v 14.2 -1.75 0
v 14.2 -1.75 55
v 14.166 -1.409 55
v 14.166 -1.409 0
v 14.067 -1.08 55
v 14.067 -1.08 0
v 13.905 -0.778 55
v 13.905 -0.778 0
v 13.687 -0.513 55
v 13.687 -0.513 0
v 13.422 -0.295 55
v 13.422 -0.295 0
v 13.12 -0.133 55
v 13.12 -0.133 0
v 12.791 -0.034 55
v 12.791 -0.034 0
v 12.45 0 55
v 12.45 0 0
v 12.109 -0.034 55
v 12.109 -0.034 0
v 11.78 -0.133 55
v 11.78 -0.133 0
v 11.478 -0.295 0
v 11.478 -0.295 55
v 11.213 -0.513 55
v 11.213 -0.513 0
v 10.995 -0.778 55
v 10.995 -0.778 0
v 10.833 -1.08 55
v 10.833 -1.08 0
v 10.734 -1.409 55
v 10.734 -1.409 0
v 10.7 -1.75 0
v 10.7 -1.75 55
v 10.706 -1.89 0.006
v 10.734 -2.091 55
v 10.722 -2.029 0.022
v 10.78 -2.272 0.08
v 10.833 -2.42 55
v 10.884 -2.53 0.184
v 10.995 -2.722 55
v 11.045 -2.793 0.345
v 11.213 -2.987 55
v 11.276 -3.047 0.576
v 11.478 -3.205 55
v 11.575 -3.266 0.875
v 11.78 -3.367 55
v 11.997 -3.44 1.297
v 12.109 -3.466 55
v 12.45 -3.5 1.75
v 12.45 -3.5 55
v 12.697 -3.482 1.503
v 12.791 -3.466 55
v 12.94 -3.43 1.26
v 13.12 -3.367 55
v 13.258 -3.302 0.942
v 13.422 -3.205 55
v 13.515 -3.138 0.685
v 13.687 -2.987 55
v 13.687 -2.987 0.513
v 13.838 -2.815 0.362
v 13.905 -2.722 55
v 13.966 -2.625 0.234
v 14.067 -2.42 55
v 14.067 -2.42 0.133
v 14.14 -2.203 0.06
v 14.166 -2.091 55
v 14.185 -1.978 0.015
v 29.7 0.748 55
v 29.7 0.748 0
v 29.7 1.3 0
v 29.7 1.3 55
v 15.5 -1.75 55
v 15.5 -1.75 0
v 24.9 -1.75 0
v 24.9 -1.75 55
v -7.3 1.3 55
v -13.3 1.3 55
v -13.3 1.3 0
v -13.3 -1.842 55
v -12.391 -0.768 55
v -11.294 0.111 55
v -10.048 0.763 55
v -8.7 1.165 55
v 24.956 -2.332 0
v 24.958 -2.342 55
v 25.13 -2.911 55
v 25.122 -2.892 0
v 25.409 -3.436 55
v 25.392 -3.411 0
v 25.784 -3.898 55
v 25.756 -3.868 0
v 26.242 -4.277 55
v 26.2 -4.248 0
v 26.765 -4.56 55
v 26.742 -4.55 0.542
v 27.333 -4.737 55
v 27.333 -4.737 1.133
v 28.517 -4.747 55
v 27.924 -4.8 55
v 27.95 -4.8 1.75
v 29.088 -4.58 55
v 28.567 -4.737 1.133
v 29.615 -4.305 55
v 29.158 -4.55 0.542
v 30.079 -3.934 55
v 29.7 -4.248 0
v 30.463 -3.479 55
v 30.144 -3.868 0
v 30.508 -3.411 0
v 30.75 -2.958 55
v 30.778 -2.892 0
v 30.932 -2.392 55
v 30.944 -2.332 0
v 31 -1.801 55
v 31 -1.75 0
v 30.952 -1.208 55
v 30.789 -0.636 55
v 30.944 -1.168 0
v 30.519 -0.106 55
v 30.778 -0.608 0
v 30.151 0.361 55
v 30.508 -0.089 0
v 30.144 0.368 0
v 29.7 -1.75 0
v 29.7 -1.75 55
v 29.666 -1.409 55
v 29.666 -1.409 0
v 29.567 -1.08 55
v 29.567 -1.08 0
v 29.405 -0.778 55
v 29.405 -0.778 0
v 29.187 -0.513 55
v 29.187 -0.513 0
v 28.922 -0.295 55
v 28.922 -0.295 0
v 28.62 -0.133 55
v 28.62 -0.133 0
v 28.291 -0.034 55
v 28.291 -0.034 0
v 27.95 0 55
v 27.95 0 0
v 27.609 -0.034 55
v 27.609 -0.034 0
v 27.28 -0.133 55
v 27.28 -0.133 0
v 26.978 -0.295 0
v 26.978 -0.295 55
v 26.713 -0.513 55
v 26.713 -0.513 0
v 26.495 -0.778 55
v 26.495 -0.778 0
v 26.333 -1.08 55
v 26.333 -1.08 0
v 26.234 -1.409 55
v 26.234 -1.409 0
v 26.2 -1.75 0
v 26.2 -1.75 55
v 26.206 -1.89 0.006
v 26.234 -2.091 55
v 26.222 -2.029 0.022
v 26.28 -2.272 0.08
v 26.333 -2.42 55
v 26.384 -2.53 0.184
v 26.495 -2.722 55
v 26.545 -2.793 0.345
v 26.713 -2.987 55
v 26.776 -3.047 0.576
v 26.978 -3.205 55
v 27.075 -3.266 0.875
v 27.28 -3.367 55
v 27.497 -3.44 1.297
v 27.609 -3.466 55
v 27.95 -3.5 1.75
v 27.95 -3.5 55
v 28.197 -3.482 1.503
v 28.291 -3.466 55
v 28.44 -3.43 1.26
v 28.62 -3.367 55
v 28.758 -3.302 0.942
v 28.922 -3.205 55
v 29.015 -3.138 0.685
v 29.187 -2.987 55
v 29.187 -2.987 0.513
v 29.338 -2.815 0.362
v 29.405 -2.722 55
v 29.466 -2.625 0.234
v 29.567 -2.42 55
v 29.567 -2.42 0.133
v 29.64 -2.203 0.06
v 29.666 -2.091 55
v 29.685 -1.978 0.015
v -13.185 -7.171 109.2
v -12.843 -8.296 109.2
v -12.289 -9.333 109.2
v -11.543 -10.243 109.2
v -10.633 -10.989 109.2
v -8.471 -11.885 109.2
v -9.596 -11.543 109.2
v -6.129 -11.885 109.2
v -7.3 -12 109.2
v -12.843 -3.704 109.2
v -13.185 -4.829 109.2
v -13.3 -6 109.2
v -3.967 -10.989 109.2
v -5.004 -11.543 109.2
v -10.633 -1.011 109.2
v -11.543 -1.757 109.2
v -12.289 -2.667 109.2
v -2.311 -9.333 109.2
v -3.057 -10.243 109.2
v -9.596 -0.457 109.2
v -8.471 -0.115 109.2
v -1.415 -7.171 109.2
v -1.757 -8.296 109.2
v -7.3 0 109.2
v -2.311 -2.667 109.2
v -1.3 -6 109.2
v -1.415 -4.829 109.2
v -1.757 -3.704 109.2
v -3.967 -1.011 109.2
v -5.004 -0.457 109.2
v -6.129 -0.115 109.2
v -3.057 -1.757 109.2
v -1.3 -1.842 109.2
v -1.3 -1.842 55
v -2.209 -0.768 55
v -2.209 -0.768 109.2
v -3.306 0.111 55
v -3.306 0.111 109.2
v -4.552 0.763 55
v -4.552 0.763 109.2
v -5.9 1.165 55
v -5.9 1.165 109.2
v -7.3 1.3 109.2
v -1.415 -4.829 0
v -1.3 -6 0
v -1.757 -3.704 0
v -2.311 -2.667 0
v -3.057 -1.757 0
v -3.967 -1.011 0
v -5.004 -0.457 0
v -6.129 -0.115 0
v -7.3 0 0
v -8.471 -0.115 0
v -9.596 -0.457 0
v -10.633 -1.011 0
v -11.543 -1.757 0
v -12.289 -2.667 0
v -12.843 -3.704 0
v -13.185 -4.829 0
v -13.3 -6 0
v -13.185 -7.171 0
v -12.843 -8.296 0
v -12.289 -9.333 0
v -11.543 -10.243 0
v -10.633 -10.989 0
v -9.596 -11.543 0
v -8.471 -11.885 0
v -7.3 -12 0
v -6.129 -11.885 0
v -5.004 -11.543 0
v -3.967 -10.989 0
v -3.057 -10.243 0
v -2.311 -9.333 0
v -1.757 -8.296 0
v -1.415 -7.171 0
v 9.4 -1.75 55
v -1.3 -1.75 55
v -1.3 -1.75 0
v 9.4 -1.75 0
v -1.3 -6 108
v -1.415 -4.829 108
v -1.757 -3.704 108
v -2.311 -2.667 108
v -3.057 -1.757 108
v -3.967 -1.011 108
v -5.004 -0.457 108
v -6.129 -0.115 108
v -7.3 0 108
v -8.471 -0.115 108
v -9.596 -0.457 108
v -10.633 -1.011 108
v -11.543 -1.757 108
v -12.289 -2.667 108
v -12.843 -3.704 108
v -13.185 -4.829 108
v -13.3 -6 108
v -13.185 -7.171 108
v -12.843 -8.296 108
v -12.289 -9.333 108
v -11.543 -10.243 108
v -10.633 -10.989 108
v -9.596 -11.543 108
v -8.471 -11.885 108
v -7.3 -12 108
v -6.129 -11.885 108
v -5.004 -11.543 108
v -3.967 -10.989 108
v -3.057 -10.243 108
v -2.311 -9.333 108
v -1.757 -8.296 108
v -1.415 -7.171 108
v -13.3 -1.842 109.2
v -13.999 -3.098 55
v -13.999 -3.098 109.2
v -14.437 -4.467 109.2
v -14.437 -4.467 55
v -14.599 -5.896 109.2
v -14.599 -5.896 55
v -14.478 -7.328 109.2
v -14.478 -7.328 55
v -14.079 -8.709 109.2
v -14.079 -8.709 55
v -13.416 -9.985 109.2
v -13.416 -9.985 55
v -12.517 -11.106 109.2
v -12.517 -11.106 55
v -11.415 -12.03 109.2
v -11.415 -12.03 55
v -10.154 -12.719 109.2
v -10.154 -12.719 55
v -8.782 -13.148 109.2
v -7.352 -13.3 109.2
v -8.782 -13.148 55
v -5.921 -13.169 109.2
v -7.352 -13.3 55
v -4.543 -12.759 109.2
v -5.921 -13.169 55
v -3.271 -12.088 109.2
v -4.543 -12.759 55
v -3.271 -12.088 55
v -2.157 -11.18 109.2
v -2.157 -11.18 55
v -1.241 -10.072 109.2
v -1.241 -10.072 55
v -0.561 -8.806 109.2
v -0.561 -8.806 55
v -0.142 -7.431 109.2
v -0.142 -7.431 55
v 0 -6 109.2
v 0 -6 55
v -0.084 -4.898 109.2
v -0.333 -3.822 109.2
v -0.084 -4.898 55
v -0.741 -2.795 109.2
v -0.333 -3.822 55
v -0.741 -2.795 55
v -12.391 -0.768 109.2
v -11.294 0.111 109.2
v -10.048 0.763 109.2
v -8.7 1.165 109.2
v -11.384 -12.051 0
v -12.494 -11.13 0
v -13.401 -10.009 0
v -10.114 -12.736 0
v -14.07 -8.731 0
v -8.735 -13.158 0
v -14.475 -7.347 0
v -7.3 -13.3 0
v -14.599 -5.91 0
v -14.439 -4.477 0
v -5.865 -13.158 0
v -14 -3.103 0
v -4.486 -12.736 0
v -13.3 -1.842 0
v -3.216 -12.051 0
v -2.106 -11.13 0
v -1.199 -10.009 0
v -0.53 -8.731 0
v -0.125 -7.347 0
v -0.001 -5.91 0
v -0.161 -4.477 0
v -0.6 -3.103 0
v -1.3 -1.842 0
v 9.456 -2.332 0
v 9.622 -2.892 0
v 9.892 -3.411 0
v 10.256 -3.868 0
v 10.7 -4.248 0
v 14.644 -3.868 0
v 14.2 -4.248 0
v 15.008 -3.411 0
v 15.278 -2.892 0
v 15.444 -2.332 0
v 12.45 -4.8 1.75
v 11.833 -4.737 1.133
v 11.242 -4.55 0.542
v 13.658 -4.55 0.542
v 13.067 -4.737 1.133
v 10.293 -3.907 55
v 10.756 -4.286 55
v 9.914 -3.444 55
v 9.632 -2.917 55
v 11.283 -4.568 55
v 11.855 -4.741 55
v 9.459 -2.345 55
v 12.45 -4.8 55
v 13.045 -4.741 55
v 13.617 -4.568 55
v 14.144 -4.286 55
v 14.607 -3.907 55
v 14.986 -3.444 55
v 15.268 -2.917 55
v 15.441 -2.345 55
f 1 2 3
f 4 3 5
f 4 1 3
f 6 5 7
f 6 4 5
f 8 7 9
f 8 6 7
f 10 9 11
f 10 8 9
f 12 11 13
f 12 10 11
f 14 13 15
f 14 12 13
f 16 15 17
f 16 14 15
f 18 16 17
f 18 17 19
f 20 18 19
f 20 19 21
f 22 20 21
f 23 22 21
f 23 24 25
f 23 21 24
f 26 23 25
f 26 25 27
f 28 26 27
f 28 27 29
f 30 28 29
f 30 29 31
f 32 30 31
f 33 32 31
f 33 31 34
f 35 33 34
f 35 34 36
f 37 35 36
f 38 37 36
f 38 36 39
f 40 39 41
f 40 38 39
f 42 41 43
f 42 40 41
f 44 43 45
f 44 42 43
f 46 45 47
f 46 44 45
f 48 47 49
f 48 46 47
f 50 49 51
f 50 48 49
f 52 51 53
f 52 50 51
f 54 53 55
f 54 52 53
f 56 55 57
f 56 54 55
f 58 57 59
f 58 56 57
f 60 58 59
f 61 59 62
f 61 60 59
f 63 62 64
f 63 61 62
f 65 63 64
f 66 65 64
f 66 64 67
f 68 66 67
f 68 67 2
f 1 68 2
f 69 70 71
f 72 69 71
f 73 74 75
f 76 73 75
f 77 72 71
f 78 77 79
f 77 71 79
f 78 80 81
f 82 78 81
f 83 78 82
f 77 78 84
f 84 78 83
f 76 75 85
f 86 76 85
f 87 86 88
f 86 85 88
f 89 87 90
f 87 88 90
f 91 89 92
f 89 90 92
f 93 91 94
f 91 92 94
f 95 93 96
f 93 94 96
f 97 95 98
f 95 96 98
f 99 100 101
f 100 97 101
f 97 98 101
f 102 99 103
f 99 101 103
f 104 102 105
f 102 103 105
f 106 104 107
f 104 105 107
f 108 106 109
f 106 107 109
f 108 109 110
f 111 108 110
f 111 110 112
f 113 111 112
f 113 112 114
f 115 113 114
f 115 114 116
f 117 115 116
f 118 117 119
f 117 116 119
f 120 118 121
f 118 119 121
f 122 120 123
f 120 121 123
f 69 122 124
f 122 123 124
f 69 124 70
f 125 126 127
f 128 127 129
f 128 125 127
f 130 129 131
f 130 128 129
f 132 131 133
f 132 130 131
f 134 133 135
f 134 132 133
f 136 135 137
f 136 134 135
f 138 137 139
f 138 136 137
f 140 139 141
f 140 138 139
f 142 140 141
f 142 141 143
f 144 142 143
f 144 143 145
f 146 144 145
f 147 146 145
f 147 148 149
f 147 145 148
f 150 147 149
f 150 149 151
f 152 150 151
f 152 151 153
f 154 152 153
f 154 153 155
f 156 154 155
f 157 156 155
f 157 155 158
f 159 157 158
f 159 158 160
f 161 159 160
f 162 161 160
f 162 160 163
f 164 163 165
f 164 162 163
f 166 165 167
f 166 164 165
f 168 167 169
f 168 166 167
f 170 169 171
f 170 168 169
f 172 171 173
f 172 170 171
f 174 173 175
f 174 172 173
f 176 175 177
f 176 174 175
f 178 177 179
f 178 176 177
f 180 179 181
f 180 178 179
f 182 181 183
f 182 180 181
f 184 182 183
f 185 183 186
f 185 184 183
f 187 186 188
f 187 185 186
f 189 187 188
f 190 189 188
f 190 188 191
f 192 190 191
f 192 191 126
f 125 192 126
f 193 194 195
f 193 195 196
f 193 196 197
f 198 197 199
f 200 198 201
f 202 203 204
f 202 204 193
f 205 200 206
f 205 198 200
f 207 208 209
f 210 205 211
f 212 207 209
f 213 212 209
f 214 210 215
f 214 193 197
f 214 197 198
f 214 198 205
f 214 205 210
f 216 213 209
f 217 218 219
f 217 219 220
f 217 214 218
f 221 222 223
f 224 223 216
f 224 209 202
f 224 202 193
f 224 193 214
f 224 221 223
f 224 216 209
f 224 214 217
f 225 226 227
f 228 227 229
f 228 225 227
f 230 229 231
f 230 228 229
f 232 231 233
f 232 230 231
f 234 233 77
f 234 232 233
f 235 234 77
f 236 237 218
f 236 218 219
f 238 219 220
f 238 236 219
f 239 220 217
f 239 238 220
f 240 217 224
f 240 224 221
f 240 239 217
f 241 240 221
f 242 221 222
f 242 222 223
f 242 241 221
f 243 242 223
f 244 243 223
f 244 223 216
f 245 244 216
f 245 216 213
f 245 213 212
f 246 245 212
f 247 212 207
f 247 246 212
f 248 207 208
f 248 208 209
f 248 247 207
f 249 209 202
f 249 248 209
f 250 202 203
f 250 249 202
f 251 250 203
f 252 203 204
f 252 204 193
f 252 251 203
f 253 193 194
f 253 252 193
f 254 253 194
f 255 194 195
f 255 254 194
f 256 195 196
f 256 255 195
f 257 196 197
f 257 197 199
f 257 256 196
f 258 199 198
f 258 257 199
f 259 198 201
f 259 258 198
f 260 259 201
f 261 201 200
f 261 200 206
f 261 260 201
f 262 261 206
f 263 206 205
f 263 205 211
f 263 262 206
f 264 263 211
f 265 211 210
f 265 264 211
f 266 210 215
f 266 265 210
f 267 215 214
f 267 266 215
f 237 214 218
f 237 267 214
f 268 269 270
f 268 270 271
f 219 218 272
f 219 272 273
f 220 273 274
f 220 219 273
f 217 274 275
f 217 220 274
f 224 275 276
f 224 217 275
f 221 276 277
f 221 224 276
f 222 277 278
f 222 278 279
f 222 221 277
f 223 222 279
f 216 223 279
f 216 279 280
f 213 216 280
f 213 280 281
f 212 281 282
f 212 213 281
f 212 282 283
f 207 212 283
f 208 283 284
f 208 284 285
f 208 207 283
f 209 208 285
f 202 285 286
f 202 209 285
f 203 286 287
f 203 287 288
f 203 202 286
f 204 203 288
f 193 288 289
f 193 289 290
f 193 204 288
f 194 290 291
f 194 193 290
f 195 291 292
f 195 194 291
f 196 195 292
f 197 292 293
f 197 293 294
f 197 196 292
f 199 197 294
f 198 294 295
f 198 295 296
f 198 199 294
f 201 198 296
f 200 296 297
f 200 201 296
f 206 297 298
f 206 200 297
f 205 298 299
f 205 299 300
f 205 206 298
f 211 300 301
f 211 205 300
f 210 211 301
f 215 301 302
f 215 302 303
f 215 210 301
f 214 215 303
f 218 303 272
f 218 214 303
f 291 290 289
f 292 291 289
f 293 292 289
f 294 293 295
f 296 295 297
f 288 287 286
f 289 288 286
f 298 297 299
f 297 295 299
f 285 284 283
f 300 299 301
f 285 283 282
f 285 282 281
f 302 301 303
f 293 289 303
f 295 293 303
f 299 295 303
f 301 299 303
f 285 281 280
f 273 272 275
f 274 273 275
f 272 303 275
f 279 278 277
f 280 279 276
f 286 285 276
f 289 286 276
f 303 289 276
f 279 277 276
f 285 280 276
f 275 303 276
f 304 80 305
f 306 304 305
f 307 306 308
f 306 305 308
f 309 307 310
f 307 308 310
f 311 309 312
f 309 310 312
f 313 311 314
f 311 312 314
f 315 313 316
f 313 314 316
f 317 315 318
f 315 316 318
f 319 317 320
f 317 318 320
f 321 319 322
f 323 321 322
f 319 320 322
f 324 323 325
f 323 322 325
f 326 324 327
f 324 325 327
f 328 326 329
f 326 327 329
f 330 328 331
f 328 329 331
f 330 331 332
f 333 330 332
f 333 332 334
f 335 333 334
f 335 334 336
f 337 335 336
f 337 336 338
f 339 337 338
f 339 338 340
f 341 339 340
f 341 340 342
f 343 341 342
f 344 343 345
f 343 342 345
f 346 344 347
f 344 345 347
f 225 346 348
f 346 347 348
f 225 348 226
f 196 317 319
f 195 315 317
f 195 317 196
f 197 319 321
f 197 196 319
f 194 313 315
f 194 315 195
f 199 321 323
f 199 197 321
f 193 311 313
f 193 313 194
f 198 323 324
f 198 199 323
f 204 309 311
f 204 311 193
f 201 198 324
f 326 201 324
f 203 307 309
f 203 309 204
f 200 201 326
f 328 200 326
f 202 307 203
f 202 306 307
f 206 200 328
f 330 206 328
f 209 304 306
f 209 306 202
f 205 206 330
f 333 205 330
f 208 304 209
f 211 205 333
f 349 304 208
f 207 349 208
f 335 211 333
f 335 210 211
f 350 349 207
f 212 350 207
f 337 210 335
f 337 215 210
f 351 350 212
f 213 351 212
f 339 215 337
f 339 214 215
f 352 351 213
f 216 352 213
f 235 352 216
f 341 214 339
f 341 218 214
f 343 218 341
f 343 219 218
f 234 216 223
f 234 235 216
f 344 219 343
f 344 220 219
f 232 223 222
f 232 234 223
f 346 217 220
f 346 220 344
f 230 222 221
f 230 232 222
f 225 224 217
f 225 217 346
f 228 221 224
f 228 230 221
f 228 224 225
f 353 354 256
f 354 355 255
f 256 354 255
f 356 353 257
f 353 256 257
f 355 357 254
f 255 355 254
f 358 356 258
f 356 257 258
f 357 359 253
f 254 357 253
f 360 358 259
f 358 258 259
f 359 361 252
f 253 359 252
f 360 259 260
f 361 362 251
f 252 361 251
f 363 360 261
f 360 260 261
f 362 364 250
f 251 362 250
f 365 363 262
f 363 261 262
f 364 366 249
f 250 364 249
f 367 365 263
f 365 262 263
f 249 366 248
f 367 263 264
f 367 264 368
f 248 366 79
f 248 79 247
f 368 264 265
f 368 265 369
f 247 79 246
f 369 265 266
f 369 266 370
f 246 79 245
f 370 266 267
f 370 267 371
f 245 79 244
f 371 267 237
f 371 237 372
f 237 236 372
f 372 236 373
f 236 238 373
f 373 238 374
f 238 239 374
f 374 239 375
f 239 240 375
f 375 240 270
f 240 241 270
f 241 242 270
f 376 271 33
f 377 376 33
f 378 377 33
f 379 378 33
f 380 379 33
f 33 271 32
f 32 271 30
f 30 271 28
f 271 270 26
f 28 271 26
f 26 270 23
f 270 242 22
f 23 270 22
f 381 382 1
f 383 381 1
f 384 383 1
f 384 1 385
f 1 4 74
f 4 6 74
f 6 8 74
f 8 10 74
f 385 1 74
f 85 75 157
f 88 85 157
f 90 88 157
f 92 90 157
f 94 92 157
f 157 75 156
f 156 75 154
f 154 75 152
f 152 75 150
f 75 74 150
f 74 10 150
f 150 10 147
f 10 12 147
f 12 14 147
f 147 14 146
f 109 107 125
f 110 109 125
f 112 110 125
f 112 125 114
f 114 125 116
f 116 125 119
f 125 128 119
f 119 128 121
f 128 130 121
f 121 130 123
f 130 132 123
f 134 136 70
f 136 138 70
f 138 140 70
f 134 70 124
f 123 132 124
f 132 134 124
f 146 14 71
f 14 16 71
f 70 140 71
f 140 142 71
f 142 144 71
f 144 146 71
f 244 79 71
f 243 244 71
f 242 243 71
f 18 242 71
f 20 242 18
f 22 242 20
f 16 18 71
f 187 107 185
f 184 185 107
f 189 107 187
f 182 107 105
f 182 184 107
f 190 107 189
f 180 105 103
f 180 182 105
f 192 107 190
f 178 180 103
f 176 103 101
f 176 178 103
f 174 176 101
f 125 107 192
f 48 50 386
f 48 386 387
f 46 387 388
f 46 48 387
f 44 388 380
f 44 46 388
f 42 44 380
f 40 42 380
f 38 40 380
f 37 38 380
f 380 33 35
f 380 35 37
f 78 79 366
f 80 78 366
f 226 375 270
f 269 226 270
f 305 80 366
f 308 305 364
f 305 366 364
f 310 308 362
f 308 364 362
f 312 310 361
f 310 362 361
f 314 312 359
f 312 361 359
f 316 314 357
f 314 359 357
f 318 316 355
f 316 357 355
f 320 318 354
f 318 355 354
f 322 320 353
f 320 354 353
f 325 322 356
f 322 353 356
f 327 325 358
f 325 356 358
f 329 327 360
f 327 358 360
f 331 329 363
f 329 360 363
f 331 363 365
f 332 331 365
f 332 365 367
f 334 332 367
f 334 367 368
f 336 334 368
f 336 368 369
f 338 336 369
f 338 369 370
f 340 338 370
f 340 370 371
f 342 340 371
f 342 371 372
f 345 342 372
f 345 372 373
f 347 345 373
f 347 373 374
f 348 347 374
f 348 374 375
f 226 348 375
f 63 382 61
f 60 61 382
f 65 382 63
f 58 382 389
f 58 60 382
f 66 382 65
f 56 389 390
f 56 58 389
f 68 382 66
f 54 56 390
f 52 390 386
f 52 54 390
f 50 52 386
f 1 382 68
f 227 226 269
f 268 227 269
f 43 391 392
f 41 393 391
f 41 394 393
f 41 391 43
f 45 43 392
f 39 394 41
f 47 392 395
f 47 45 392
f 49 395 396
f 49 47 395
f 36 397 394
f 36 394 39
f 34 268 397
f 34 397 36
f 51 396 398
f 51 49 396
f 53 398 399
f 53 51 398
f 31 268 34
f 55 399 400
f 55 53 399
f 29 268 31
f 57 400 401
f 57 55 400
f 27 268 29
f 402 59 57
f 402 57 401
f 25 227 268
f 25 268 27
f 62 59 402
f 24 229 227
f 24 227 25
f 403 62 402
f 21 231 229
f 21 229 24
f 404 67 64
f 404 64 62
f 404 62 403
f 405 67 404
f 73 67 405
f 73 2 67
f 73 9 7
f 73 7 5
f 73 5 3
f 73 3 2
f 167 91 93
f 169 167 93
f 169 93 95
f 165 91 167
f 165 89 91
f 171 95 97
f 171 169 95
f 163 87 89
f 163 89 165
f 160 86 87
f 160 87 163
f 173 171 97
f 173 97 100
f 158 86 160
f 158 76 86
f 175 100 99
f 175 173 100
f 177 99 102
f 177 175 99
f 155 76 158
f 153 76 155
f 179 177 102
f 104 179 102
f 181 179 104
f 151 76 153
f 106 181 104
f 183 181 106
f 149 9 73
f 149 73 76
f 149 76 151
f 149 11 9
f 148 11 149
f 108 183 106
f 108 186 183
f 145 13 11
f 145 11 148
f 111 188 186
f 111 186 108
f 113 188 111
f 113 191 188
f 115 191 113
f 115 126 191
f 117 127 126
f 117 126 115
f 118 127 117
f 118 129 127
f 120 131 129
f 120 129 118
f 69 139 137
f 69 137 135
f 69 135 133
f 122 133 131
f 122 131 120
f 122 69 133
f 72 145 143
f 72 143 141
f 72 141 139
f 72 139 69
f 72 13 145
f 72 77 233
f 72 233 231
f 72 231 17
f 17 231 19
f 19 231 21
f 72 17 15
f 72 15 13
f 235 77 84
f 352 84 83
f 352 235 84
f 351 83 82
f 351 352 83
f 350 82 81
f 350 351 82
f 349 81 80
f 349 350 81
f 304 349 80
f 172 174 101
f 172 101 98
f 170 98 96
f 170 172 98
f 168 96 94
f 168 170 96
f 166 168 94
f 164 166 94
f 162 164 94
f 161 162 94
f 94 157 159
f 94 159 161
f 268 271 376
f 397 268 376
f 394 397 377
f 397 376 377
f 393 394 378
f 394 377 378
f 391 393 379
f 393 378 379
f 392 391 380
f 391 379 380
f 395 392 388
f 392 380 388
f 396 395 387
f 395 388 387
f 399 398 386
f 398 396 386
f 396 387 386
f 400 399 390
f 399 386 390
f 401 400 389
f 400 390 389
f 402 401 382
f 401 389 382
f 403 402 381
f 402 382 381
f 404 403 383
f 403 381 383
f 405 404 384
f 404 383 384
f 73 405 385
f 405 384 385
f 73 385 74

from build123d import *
from build123d import SkipClean  # not in build123d's __all__

# Parameters (mm, degrees)
F0_R     = 6
F0_R_2   = 1.75
F1_DEPTH = 109.2
F3_DEPTH = 25
F4_W     = 51.9569627941
F4_H     = 21.8115057796
F4_R     = 7.3
F5_DEPTH = 54.2
F6_R     = 6
F7_DEPTH = 1.2


with BuildPart() as f1:
    # F0 (on Top) → F1 (new body)
    with BuildSketch(Plane.XY):
        with BuildLine():
            Line((-1.3, -1.8418754227), (-1.3, -1.75))
            Line((-1.3, -1.75), (9.4, -1.75))
            ThreePointArc((9.4, -1.75), (12.45, -4.8), (15.5, -1.75))
            Line((15.5, -1.75), (24.9, -1.75))
            ThreePointArc((24.9, -1.75), (29.358012784, -4.4555498517), (29.7, 0.7479991994))
            Line((29.7, 0.7479991994), (29.7, 1.3))
            Line((29.7, 1.3), (-13.3, 1.3))
            Line((-13.3, 1.3), (-13.3, -1.8418754227))
            ThreePointArc((-13.3, -1.8418754227), (-7.3, -13.3), (-1.3, -1.8418754227))
        make_face()
        with Locations((-7.3, -6)):
            Circle(F0_R, mode=Mode.SUBTRACT)
        with Locations((12.45, -1.75)):
            Circle(F0_R_2, mode=Mode.SUBTRACT)
        with Locations((27.95, -1.75)):
            Circle(F0_R_2, mode=Mode.SUBTRACT)
    extrude(amount=F1_DEPTH)

    # F2 (on face) → F3 (cut)
    with BuildSketch(Plane.XZ.offset(1.75)):
        Polygon((12.45, 1.75), (10.7, 0), (14.2, 0), align=None)
        Polygon((27.95, 1.75), (26.2, 0), (29.7, 0), align=None)
    extrude(amount=F3_DEPTH, mode=Mode.SUBTRACT)

    # F4 (on face) → F5 (cut)
    with BuildSketch(Plane.XY.offset(109.2)):
        with Locations((7.5893197209, -5.5296784267)):
            Rectangle(F4_W, F4_H)
        with Locations((-7.3, -6)):
            Circle(F4_R, mode=Mode.SUBTRACT)
    with SkipClean():  # cleaning this boolean's faces spoils the solid; the shape is the same uncleaned
        extrude(amount=-F5_DEPTH, mode=Mode.SUBTRACT)


with BuildPart() as f7:
    # F6 (on face) → F7 (new body)
    with BuildSketch(Plane.XY.offset(109.2)):
        with Locations((-7.3, -6)):
            Circle(F6_R)
    extrude(amount=-F7_DEPTH)


solid = Compound([f1.part, f7.part])
